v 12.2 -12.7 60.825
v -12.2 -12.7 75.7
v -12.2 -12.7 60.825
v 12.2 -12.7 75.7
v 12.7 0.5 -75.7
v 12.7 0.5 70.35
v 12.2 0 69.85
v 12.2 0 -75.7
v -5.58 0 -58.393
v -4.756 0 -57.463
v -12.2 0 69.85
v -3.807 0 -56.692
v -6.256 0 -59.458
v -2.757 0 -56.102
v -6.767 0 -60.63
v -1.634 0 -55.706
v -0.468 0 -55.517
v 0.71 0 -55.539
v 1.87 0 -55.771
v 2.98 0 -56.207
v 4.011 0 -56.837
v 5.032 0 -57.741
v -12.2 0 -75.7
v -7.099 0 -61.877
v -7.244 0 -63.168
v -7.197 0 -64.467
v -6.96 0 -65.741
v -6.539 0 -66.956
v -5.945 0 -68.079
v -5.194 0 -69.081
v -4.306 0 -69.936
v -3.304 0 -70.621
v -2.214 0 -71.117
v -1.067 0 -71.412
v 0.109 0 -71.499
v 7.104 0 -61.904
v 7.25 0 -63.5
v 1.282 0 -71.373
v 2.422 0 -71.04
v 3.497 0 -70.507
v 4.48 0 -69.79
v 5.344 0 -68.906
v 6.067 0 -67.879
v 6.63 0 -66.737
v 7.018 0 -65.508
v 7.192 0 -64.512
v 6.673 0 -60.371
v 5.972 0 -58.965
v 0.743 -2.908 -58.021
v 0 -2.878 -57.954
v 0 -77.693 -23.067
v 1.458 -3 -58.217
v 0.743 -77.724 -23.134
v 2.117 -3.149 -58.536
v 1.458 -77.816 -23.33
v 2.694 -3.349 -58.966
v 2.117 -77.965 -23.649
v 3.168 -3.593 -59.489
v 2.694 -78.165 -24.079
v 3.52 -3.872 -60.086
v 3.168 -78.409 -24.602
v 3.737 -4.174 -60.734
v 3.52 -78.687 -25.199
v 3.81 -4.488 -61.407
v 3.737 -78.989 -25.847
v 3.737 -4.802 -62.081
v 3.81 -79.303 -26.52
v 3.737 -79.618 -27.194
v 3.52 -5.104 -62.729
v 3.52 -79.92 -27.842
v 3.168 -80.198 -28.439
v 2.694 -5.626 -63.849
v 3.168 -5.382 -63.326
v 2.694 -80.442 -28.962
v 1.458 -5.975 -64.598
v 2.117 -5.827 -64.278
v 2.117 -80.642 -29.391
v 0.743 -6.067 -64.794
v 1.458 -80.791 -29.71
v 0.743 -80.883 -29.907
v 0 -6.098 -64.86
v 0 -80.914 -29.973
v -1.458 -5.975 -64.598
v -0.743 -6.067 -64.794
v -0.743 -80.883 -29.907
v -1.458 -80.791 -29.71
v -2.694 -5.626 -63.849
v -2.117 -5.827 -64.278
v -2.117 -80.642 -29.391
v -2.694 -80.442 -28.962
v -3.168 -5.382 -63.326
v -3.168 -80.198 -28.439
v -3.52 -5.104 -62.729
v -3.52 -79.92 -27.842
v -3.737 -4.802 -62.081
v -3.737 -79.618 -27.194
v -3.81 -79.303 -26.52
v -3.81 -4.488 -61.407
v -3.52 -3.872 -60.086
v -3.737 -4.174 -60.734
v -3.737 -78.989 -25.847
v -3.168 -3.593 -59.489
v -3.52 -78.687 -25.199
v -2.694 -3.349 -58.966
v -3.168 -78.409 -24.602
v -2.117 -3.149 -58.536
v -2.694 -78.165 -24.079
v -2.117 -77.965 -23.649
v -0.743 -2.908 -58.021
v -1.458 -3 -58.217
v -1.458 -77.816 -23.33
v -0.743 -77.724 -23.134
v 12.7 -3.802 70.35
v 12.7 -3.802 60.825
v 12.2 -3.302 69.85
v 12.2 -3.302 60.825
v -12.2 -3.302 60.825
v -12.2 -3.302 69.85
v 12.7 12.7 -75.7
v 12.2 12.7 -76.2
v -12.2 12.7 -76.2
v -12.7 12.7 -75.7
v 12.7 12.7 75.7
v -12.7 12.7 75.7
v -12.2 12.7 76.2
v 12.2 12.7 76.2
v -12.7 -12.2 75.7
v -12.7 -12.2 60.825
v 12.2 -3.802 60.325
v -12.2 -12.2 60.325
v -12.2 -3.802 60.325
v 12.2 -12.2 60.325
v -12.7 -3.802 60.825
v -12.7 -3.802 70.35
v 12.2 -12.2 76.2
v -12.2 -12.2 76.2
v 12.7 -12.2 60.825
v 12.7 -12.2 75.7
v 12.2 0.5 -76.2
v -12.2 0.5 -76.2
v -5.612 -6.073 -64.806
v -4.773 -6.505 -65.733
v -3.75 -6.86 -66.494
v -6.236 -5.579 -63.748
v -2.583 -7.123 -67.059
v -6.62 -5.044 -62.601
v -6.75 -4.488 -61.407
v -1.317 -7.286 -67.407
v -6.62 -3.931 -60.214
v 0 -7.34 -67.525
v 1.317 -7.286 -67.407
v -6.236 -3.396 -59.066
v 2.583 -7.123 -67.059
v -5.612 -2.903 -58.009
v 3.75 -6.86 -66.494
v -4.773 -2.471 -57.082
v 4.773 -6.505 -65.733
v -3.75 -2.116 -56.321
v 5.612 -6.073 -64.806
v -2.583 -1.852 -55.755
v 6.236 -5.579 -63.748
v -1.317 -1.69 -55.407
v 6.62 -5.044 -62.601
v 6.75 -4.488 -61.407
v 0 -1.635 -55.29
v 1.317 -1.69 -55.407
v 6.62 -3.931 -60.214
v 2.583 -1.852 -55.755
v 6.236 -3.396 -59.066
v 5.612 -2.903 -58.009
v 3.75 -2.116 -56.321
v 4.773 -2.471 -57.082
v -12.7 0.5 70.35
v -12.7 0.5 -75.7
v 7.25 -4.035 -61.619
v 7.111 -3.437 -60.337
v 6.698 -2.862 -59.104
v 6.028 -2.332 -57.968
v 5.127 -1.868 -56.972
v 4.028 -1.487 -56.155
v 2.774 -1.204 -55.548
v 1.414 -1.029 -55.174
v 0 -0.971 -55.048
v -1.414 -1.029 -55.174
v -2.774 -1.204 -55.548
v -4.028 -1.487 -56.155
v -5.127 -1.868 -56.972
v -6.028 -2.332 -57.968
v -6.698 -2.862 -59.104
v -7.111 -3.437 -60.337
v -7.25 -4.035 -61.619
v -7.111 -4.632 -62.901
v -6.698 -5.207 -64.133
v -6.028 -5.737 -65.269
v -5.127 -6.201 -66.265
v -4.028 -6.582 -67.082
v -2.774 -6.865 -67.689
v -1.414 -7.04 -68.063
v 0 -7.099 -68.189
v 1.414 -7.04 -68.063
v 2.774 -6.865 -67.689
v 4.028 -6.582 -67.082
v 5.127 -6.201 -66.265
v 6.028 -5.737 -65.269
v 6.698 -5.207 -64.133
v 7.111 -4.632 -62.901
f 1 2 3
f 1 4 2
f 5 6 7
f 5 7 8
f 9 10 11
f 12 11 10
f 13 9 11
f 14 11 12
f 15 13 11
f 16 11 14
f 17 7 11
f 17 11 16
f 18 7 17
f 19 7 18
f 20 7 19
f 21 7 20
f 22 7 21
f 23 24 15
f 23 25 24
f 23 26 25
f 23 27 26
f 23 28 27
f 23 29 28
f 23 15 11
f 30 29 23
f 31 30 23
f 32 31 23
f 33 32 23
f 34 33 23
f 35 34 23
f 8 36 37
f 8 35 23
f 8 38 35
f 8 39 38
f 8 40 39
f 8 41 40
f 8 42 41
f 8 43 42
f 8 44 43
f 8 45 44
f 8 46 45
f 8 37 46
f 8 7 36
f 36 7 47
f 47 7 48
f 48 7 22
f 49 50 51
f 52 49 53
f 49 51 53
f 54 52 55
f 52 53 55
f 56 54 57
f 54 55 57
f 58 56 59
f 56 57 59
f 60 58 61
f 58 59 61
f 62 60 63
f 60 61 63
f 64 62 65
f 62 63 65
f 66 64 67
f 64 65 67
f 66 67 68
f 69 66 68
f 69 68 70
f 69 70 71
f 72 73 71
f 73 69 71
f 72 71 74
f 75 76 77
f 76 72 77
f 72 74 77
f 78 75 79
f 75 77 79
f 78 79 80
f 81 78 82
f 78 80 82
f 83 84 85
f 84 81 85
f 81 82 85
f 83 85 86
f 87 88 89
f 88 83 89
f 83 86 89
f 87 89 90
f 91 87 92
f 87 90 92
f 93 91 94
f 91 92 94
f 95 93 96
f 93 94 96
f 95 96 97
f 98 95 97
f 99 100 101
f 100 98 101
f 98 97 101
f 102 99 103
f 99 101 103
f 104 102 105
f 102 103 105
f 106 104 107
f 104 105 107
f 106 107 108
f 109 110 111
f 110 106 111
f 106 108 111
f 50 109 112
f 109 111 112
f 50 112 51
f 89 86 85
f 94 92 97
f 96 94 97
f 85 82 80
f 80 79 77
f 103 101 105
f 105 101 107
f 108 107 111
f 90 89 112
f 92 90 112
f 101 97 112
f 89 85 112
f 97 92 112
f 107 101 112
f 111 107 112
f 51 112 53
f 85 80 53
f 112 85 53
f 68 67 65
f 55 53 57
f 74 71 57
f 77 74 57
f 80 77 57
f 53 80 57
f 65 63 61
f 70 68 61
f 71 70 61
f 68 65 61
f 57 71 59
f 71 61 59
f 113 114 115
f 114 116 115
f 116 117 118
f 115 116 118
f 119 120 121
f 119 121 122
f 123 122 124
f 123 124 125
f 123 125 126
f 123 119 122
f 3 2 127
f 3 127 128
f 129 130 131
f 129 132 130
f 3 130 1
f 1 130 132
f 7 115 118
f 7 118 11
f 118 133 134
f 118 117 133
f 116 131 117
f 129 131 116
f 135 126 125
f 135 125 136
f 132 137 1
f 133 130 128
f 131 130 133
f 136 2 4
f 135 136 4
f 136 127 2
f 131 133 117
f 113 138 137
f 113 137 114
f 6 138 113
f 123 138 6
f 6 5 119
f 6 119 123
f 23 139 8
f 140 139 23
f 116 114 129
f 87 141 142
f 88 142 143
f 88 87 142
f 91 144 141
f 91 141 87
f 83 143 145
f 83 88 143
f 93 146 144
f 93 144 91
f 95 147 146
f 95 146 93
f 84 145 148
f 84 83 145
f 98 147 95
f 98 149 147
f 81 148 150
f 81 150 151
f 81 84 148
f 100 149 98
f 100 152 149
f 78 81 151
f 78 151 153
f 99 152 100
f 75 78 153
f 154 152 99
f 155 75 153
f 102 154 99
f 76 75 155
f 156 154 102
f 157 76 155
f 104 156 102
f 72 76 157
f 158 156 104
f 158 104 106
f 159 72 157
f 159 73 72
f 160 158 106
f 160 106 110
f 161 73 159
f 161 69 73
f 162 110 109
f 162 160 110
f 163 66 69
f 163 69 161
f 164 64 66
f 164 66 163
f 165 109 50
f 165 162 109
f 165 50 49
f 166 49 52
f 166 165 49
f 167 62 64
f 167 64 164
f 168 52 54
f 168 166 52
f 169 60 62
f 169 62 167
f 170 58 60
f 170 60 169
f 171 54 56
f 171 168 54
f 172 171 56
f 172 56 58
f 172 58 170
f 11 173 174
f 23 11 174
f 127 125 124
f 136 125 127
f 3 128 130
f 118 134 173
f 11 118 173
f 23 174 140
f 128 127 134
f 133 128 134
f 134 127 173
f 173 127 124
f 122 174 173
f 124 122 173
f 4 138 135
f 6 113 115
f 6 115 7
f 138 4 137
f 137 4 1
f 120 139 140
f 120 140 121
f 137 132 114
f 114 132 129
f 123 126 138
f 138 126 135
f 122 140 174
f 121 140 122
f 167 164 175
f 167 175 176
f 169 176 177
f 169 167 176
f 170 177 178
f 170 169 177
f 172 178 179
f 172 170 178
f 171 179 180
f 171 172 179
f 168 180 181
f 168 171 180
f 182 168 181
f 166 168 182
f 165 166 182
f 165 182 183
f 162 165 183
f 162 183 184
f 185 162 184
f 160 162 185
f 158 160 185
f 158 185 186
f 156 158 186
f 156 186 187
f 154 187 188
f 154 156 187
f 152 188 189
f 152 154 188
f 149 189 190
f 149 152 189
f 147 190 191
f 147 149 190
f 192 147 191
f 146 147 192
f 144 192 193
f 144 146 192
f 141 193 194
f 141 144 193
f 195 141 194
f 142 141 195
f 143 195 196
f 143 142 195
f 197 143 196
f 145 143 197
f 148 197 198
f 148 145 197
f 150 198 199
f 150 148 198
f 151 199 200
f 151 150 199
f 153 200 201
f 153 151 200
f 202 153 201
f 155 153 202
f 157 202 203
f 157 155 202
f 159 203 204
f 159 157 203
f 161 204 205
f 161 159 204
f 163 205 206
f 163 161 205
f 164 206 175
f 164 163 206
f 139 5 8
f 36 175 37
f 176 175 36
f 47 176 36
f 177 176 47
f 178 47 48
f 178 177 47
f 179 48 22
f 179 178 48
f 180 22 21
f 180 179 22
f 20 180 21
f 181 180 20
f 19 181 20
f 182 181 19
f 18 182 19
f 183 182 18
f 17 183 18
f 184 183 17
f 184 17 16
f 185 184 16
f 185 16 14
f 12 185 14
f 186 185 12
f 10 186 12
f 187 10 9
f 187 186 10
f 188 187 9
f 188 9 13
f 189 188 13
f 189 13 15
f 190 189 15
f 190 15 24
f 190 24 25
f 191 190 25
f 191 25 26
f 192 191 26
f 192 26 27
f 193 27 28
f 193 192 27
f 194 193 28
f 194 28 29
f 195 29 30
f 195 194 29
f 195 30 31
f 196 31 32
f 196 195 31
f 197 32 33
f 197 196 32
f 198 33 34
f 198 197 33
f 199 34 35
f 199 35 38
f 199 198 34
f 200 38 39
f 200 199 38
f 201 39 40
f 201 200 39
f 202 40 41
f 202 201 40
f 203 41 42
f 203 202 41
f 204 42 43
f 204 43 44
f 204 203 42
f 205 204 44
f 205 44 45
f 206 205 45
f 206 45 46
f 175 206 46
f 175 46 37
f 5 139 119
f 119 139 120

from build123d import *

# Parameters (mm, degrees)
F1_DEPTH = 12.7
F4_SIZE  = 0.5
F6_R     = 7.25
F7_DEPTH = 9.3323626992
F8_SIZE  = 0.5


# Not quite as in the source:
# - a feature names something its author has since deleted; it is built from what else it names


with BuildPart() as f1:
    # F0 (on Right) → F1 (new body, symmetric)
    with BuildSketch(Plane.YZ):
        Polygon((12.7, 76.2), (-12.7, 76.2), (-12.7, 60.325), (-3.302, 60.325), (-3.302, 69.85), (0, 69.85), (0, -76.2), (12.7, -76.2), align=None)
    extrude(amount=F1_DEPTH, both=True)

    # F2 (on Right) → F3 (revolve)
    with BuildSketch(Plane.YZ):
        Polygon((-77.6932350437, -23.067179641), (-79.3034106209, -26.5202123096), (6.35, -66.4610536293), (7.9601755772, -63.0080209607), align=None)
    revolve(axis=Axis((0, -36.4767053105, -46.4906329695), (0, 0.906307787, -0.4226182617)))

    # F4
    f4_edges = [f1.edges().sort_by_distance(p)[0] for p in [
        (-12.7, 0, 76.2),
        (-12.7, 0, -3.175),
        (-12.7, 6.35, -76.2),
        (-12.7, -1.651, 69.85),
        (-12.7, -3.302, 65.0875),
        (-12.7, -12.7, 68.2625),
        (-12.7, -8.001, 60.325),
        (12.7, 6.35, -76.2),
        (12.7, 0, 76.2),
        (12.7, -12.7, 68.2625),
        (12.7, -1.651, 69.85),
        (12.7, -3.302, 65.0875),
        (12.7, -8.001, 60.325),
        (12.7, 0, -3.175),
        (0, 0, -76.2),
        (0, -12.7, 76.2),
        (0, -12.7, 60.325),
        (0, -3.302, 60.325),
    ]]
    chamfer(f4_edges, length=F4_SIZE)

    # F6 (on offset) → F7 (join, up to face)
    with BuildSketch(Plane(origin=(0, 19.834208268, -9.2488432088), x_dir=(1, 0, 0), z_dir=(0, -0.906307787, 0.4226182617))):
        with Locations((0, -57.5505444768)):
            Circle(F6_R)
    extrude(amount=-F7_DEPTH)

    # F8
    f8_edges = [f1.edges().sort_by_distance(p)[0] for p in [
        (-7.25, -4.487703, -61.40735),
    ]]
    chamfer(f8_edges, length=F8_SIZE)


solid = f1.part
